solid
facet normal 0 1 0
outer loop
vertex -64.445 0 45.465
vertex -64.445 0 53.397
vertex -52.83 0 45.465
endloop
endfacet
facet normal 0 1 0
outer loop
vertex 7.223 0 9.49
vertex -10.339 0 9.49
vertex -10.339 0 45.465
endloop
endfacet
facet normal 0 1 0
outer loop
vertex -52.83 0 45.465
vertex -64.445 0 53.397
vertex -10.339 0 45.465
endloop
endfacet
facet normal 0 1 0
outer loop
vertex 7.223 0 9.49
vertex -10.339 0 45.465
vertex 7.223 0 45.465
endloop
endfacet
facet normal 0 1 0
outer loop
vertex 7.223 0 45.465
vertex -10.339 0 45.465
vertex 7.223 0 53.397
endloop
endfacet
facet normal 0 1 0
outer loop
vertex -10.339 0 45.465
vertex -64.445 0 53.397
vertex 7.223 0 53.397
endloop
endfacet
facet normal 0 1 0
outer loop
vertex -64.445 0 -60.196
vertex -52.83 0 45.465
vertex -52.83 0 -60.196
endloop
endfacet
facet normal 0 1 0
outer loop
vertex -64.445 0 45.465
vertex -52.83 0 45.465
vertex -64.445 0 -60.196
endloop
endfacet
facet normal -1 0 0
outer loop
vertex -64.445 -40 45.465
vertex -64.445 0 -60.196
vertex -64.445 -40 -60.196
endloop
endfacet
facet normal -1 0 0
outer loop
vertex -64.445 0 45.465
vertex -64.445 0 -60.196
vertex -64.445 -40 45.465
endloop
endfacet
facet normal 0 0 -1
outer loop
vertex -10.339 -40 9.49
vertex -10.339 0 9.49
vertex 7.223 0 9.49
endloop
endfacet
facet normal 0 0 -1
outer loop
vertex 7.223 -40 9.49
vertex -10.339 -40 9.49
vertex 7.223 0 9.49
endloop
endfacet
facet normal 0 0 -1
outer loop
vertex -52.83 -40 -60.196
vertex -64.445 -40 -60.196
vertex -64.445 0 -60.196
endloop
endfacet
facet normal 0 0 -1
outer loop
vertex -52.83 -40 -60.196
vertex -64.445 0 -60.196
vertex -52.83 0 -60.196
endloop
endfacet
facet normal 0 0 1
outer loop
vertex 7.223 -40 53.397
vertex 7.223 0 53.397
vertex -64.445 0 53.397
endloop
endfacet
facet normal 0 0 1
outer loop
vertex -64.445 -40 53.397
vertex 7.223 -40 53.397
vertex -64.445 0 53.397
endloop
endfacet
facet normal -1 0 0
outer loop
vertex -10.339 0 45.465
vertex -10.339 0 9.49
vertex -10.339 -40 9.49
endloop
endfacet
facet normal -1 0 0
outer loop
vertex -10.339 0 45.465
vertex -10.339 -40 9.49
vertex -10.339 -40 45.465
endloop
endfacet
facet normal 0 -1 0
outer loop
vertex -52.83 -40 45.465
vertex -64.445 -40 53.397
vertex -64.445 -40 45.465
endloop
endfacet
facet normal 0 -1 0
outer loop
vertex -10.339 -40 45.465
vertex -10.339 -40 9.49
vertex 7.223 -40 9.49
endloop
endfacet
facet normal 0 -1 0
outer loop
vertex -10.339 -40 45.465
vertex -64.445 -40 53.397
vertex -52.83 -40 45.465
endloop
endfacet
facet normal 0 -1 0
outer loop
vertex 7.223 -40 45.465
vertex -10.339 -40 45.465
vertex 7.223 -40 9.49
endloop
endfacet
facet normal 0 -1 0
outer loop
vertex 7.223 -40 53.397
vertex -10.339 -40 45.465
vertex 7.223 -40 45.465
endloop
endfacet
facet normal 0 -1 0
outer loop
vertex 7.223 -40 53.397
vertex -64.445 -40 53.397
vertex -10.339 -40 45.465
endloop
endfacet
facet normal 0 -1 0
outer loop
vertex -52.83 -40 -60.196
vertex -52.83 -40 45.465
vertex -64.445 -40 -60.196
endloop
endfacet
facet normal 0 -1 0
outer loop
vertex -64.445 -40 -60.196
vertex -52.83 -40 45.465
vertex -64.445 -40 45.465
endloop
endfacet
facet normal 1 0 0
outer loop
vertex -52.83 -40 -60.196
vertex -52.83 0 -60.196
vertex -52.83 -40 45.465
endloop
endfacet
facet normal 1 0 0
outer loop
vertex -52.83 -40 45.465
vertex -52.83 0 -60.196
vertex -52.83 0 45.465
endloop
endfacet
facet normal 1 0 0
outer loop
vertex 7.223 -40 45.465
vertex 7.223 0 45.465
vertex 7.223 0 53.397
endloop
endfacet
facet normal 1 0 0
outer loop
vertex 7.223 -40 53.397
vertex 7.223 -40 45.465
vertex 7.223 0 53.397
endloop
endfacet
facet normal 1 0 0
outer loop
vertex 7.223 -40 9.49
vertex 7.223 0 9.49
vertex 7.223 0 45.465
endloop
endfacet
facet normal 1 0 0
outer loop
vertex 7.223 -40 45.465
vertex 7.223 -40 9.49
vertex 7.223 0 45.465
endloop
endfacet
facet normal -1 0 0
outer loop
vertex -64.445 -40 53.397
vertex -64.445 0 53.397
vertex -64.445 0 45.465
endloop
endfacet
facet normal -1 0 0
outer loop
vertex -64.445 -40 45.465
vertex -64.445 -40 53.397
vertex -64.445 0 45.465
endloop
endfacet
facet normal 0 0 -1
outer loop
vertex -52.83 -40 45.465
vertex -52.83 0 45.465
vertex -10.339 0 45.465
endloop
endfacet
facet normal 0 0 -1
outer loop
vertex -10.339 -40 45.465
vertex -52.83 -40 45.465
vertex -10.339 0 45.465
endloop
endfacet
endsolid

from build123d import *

# Parameters (mm, degrees)
F0_W     = 11.614211
F0_H     = 105.660983
F0_W_2   = 17.562951
F0_H_2   = 35.975726
F1_DEPTH = 40


with BuildPart() as f1:
    # F0 (on Front) → F1 (new body)
    with BuildSketch(Plane.XZ):
        Polygon((-64.444698, 53.397033), (-64.444698, 45.465384), (-52.830487, 45.465384), (-10.339479, 45.465384), (7.223472, 45.465384), (7.223472, 53.397033), align=None)
        with Locations((-58.637592, -7.365107)):
            Rectangle(F0_W, F0_H)
        with Locations((-1.558003, 27.477521)):
            Rectangle(F0_W_2, F0_H_2)
    extrude(amount=F1_DEPTH)


solid = f1.part
